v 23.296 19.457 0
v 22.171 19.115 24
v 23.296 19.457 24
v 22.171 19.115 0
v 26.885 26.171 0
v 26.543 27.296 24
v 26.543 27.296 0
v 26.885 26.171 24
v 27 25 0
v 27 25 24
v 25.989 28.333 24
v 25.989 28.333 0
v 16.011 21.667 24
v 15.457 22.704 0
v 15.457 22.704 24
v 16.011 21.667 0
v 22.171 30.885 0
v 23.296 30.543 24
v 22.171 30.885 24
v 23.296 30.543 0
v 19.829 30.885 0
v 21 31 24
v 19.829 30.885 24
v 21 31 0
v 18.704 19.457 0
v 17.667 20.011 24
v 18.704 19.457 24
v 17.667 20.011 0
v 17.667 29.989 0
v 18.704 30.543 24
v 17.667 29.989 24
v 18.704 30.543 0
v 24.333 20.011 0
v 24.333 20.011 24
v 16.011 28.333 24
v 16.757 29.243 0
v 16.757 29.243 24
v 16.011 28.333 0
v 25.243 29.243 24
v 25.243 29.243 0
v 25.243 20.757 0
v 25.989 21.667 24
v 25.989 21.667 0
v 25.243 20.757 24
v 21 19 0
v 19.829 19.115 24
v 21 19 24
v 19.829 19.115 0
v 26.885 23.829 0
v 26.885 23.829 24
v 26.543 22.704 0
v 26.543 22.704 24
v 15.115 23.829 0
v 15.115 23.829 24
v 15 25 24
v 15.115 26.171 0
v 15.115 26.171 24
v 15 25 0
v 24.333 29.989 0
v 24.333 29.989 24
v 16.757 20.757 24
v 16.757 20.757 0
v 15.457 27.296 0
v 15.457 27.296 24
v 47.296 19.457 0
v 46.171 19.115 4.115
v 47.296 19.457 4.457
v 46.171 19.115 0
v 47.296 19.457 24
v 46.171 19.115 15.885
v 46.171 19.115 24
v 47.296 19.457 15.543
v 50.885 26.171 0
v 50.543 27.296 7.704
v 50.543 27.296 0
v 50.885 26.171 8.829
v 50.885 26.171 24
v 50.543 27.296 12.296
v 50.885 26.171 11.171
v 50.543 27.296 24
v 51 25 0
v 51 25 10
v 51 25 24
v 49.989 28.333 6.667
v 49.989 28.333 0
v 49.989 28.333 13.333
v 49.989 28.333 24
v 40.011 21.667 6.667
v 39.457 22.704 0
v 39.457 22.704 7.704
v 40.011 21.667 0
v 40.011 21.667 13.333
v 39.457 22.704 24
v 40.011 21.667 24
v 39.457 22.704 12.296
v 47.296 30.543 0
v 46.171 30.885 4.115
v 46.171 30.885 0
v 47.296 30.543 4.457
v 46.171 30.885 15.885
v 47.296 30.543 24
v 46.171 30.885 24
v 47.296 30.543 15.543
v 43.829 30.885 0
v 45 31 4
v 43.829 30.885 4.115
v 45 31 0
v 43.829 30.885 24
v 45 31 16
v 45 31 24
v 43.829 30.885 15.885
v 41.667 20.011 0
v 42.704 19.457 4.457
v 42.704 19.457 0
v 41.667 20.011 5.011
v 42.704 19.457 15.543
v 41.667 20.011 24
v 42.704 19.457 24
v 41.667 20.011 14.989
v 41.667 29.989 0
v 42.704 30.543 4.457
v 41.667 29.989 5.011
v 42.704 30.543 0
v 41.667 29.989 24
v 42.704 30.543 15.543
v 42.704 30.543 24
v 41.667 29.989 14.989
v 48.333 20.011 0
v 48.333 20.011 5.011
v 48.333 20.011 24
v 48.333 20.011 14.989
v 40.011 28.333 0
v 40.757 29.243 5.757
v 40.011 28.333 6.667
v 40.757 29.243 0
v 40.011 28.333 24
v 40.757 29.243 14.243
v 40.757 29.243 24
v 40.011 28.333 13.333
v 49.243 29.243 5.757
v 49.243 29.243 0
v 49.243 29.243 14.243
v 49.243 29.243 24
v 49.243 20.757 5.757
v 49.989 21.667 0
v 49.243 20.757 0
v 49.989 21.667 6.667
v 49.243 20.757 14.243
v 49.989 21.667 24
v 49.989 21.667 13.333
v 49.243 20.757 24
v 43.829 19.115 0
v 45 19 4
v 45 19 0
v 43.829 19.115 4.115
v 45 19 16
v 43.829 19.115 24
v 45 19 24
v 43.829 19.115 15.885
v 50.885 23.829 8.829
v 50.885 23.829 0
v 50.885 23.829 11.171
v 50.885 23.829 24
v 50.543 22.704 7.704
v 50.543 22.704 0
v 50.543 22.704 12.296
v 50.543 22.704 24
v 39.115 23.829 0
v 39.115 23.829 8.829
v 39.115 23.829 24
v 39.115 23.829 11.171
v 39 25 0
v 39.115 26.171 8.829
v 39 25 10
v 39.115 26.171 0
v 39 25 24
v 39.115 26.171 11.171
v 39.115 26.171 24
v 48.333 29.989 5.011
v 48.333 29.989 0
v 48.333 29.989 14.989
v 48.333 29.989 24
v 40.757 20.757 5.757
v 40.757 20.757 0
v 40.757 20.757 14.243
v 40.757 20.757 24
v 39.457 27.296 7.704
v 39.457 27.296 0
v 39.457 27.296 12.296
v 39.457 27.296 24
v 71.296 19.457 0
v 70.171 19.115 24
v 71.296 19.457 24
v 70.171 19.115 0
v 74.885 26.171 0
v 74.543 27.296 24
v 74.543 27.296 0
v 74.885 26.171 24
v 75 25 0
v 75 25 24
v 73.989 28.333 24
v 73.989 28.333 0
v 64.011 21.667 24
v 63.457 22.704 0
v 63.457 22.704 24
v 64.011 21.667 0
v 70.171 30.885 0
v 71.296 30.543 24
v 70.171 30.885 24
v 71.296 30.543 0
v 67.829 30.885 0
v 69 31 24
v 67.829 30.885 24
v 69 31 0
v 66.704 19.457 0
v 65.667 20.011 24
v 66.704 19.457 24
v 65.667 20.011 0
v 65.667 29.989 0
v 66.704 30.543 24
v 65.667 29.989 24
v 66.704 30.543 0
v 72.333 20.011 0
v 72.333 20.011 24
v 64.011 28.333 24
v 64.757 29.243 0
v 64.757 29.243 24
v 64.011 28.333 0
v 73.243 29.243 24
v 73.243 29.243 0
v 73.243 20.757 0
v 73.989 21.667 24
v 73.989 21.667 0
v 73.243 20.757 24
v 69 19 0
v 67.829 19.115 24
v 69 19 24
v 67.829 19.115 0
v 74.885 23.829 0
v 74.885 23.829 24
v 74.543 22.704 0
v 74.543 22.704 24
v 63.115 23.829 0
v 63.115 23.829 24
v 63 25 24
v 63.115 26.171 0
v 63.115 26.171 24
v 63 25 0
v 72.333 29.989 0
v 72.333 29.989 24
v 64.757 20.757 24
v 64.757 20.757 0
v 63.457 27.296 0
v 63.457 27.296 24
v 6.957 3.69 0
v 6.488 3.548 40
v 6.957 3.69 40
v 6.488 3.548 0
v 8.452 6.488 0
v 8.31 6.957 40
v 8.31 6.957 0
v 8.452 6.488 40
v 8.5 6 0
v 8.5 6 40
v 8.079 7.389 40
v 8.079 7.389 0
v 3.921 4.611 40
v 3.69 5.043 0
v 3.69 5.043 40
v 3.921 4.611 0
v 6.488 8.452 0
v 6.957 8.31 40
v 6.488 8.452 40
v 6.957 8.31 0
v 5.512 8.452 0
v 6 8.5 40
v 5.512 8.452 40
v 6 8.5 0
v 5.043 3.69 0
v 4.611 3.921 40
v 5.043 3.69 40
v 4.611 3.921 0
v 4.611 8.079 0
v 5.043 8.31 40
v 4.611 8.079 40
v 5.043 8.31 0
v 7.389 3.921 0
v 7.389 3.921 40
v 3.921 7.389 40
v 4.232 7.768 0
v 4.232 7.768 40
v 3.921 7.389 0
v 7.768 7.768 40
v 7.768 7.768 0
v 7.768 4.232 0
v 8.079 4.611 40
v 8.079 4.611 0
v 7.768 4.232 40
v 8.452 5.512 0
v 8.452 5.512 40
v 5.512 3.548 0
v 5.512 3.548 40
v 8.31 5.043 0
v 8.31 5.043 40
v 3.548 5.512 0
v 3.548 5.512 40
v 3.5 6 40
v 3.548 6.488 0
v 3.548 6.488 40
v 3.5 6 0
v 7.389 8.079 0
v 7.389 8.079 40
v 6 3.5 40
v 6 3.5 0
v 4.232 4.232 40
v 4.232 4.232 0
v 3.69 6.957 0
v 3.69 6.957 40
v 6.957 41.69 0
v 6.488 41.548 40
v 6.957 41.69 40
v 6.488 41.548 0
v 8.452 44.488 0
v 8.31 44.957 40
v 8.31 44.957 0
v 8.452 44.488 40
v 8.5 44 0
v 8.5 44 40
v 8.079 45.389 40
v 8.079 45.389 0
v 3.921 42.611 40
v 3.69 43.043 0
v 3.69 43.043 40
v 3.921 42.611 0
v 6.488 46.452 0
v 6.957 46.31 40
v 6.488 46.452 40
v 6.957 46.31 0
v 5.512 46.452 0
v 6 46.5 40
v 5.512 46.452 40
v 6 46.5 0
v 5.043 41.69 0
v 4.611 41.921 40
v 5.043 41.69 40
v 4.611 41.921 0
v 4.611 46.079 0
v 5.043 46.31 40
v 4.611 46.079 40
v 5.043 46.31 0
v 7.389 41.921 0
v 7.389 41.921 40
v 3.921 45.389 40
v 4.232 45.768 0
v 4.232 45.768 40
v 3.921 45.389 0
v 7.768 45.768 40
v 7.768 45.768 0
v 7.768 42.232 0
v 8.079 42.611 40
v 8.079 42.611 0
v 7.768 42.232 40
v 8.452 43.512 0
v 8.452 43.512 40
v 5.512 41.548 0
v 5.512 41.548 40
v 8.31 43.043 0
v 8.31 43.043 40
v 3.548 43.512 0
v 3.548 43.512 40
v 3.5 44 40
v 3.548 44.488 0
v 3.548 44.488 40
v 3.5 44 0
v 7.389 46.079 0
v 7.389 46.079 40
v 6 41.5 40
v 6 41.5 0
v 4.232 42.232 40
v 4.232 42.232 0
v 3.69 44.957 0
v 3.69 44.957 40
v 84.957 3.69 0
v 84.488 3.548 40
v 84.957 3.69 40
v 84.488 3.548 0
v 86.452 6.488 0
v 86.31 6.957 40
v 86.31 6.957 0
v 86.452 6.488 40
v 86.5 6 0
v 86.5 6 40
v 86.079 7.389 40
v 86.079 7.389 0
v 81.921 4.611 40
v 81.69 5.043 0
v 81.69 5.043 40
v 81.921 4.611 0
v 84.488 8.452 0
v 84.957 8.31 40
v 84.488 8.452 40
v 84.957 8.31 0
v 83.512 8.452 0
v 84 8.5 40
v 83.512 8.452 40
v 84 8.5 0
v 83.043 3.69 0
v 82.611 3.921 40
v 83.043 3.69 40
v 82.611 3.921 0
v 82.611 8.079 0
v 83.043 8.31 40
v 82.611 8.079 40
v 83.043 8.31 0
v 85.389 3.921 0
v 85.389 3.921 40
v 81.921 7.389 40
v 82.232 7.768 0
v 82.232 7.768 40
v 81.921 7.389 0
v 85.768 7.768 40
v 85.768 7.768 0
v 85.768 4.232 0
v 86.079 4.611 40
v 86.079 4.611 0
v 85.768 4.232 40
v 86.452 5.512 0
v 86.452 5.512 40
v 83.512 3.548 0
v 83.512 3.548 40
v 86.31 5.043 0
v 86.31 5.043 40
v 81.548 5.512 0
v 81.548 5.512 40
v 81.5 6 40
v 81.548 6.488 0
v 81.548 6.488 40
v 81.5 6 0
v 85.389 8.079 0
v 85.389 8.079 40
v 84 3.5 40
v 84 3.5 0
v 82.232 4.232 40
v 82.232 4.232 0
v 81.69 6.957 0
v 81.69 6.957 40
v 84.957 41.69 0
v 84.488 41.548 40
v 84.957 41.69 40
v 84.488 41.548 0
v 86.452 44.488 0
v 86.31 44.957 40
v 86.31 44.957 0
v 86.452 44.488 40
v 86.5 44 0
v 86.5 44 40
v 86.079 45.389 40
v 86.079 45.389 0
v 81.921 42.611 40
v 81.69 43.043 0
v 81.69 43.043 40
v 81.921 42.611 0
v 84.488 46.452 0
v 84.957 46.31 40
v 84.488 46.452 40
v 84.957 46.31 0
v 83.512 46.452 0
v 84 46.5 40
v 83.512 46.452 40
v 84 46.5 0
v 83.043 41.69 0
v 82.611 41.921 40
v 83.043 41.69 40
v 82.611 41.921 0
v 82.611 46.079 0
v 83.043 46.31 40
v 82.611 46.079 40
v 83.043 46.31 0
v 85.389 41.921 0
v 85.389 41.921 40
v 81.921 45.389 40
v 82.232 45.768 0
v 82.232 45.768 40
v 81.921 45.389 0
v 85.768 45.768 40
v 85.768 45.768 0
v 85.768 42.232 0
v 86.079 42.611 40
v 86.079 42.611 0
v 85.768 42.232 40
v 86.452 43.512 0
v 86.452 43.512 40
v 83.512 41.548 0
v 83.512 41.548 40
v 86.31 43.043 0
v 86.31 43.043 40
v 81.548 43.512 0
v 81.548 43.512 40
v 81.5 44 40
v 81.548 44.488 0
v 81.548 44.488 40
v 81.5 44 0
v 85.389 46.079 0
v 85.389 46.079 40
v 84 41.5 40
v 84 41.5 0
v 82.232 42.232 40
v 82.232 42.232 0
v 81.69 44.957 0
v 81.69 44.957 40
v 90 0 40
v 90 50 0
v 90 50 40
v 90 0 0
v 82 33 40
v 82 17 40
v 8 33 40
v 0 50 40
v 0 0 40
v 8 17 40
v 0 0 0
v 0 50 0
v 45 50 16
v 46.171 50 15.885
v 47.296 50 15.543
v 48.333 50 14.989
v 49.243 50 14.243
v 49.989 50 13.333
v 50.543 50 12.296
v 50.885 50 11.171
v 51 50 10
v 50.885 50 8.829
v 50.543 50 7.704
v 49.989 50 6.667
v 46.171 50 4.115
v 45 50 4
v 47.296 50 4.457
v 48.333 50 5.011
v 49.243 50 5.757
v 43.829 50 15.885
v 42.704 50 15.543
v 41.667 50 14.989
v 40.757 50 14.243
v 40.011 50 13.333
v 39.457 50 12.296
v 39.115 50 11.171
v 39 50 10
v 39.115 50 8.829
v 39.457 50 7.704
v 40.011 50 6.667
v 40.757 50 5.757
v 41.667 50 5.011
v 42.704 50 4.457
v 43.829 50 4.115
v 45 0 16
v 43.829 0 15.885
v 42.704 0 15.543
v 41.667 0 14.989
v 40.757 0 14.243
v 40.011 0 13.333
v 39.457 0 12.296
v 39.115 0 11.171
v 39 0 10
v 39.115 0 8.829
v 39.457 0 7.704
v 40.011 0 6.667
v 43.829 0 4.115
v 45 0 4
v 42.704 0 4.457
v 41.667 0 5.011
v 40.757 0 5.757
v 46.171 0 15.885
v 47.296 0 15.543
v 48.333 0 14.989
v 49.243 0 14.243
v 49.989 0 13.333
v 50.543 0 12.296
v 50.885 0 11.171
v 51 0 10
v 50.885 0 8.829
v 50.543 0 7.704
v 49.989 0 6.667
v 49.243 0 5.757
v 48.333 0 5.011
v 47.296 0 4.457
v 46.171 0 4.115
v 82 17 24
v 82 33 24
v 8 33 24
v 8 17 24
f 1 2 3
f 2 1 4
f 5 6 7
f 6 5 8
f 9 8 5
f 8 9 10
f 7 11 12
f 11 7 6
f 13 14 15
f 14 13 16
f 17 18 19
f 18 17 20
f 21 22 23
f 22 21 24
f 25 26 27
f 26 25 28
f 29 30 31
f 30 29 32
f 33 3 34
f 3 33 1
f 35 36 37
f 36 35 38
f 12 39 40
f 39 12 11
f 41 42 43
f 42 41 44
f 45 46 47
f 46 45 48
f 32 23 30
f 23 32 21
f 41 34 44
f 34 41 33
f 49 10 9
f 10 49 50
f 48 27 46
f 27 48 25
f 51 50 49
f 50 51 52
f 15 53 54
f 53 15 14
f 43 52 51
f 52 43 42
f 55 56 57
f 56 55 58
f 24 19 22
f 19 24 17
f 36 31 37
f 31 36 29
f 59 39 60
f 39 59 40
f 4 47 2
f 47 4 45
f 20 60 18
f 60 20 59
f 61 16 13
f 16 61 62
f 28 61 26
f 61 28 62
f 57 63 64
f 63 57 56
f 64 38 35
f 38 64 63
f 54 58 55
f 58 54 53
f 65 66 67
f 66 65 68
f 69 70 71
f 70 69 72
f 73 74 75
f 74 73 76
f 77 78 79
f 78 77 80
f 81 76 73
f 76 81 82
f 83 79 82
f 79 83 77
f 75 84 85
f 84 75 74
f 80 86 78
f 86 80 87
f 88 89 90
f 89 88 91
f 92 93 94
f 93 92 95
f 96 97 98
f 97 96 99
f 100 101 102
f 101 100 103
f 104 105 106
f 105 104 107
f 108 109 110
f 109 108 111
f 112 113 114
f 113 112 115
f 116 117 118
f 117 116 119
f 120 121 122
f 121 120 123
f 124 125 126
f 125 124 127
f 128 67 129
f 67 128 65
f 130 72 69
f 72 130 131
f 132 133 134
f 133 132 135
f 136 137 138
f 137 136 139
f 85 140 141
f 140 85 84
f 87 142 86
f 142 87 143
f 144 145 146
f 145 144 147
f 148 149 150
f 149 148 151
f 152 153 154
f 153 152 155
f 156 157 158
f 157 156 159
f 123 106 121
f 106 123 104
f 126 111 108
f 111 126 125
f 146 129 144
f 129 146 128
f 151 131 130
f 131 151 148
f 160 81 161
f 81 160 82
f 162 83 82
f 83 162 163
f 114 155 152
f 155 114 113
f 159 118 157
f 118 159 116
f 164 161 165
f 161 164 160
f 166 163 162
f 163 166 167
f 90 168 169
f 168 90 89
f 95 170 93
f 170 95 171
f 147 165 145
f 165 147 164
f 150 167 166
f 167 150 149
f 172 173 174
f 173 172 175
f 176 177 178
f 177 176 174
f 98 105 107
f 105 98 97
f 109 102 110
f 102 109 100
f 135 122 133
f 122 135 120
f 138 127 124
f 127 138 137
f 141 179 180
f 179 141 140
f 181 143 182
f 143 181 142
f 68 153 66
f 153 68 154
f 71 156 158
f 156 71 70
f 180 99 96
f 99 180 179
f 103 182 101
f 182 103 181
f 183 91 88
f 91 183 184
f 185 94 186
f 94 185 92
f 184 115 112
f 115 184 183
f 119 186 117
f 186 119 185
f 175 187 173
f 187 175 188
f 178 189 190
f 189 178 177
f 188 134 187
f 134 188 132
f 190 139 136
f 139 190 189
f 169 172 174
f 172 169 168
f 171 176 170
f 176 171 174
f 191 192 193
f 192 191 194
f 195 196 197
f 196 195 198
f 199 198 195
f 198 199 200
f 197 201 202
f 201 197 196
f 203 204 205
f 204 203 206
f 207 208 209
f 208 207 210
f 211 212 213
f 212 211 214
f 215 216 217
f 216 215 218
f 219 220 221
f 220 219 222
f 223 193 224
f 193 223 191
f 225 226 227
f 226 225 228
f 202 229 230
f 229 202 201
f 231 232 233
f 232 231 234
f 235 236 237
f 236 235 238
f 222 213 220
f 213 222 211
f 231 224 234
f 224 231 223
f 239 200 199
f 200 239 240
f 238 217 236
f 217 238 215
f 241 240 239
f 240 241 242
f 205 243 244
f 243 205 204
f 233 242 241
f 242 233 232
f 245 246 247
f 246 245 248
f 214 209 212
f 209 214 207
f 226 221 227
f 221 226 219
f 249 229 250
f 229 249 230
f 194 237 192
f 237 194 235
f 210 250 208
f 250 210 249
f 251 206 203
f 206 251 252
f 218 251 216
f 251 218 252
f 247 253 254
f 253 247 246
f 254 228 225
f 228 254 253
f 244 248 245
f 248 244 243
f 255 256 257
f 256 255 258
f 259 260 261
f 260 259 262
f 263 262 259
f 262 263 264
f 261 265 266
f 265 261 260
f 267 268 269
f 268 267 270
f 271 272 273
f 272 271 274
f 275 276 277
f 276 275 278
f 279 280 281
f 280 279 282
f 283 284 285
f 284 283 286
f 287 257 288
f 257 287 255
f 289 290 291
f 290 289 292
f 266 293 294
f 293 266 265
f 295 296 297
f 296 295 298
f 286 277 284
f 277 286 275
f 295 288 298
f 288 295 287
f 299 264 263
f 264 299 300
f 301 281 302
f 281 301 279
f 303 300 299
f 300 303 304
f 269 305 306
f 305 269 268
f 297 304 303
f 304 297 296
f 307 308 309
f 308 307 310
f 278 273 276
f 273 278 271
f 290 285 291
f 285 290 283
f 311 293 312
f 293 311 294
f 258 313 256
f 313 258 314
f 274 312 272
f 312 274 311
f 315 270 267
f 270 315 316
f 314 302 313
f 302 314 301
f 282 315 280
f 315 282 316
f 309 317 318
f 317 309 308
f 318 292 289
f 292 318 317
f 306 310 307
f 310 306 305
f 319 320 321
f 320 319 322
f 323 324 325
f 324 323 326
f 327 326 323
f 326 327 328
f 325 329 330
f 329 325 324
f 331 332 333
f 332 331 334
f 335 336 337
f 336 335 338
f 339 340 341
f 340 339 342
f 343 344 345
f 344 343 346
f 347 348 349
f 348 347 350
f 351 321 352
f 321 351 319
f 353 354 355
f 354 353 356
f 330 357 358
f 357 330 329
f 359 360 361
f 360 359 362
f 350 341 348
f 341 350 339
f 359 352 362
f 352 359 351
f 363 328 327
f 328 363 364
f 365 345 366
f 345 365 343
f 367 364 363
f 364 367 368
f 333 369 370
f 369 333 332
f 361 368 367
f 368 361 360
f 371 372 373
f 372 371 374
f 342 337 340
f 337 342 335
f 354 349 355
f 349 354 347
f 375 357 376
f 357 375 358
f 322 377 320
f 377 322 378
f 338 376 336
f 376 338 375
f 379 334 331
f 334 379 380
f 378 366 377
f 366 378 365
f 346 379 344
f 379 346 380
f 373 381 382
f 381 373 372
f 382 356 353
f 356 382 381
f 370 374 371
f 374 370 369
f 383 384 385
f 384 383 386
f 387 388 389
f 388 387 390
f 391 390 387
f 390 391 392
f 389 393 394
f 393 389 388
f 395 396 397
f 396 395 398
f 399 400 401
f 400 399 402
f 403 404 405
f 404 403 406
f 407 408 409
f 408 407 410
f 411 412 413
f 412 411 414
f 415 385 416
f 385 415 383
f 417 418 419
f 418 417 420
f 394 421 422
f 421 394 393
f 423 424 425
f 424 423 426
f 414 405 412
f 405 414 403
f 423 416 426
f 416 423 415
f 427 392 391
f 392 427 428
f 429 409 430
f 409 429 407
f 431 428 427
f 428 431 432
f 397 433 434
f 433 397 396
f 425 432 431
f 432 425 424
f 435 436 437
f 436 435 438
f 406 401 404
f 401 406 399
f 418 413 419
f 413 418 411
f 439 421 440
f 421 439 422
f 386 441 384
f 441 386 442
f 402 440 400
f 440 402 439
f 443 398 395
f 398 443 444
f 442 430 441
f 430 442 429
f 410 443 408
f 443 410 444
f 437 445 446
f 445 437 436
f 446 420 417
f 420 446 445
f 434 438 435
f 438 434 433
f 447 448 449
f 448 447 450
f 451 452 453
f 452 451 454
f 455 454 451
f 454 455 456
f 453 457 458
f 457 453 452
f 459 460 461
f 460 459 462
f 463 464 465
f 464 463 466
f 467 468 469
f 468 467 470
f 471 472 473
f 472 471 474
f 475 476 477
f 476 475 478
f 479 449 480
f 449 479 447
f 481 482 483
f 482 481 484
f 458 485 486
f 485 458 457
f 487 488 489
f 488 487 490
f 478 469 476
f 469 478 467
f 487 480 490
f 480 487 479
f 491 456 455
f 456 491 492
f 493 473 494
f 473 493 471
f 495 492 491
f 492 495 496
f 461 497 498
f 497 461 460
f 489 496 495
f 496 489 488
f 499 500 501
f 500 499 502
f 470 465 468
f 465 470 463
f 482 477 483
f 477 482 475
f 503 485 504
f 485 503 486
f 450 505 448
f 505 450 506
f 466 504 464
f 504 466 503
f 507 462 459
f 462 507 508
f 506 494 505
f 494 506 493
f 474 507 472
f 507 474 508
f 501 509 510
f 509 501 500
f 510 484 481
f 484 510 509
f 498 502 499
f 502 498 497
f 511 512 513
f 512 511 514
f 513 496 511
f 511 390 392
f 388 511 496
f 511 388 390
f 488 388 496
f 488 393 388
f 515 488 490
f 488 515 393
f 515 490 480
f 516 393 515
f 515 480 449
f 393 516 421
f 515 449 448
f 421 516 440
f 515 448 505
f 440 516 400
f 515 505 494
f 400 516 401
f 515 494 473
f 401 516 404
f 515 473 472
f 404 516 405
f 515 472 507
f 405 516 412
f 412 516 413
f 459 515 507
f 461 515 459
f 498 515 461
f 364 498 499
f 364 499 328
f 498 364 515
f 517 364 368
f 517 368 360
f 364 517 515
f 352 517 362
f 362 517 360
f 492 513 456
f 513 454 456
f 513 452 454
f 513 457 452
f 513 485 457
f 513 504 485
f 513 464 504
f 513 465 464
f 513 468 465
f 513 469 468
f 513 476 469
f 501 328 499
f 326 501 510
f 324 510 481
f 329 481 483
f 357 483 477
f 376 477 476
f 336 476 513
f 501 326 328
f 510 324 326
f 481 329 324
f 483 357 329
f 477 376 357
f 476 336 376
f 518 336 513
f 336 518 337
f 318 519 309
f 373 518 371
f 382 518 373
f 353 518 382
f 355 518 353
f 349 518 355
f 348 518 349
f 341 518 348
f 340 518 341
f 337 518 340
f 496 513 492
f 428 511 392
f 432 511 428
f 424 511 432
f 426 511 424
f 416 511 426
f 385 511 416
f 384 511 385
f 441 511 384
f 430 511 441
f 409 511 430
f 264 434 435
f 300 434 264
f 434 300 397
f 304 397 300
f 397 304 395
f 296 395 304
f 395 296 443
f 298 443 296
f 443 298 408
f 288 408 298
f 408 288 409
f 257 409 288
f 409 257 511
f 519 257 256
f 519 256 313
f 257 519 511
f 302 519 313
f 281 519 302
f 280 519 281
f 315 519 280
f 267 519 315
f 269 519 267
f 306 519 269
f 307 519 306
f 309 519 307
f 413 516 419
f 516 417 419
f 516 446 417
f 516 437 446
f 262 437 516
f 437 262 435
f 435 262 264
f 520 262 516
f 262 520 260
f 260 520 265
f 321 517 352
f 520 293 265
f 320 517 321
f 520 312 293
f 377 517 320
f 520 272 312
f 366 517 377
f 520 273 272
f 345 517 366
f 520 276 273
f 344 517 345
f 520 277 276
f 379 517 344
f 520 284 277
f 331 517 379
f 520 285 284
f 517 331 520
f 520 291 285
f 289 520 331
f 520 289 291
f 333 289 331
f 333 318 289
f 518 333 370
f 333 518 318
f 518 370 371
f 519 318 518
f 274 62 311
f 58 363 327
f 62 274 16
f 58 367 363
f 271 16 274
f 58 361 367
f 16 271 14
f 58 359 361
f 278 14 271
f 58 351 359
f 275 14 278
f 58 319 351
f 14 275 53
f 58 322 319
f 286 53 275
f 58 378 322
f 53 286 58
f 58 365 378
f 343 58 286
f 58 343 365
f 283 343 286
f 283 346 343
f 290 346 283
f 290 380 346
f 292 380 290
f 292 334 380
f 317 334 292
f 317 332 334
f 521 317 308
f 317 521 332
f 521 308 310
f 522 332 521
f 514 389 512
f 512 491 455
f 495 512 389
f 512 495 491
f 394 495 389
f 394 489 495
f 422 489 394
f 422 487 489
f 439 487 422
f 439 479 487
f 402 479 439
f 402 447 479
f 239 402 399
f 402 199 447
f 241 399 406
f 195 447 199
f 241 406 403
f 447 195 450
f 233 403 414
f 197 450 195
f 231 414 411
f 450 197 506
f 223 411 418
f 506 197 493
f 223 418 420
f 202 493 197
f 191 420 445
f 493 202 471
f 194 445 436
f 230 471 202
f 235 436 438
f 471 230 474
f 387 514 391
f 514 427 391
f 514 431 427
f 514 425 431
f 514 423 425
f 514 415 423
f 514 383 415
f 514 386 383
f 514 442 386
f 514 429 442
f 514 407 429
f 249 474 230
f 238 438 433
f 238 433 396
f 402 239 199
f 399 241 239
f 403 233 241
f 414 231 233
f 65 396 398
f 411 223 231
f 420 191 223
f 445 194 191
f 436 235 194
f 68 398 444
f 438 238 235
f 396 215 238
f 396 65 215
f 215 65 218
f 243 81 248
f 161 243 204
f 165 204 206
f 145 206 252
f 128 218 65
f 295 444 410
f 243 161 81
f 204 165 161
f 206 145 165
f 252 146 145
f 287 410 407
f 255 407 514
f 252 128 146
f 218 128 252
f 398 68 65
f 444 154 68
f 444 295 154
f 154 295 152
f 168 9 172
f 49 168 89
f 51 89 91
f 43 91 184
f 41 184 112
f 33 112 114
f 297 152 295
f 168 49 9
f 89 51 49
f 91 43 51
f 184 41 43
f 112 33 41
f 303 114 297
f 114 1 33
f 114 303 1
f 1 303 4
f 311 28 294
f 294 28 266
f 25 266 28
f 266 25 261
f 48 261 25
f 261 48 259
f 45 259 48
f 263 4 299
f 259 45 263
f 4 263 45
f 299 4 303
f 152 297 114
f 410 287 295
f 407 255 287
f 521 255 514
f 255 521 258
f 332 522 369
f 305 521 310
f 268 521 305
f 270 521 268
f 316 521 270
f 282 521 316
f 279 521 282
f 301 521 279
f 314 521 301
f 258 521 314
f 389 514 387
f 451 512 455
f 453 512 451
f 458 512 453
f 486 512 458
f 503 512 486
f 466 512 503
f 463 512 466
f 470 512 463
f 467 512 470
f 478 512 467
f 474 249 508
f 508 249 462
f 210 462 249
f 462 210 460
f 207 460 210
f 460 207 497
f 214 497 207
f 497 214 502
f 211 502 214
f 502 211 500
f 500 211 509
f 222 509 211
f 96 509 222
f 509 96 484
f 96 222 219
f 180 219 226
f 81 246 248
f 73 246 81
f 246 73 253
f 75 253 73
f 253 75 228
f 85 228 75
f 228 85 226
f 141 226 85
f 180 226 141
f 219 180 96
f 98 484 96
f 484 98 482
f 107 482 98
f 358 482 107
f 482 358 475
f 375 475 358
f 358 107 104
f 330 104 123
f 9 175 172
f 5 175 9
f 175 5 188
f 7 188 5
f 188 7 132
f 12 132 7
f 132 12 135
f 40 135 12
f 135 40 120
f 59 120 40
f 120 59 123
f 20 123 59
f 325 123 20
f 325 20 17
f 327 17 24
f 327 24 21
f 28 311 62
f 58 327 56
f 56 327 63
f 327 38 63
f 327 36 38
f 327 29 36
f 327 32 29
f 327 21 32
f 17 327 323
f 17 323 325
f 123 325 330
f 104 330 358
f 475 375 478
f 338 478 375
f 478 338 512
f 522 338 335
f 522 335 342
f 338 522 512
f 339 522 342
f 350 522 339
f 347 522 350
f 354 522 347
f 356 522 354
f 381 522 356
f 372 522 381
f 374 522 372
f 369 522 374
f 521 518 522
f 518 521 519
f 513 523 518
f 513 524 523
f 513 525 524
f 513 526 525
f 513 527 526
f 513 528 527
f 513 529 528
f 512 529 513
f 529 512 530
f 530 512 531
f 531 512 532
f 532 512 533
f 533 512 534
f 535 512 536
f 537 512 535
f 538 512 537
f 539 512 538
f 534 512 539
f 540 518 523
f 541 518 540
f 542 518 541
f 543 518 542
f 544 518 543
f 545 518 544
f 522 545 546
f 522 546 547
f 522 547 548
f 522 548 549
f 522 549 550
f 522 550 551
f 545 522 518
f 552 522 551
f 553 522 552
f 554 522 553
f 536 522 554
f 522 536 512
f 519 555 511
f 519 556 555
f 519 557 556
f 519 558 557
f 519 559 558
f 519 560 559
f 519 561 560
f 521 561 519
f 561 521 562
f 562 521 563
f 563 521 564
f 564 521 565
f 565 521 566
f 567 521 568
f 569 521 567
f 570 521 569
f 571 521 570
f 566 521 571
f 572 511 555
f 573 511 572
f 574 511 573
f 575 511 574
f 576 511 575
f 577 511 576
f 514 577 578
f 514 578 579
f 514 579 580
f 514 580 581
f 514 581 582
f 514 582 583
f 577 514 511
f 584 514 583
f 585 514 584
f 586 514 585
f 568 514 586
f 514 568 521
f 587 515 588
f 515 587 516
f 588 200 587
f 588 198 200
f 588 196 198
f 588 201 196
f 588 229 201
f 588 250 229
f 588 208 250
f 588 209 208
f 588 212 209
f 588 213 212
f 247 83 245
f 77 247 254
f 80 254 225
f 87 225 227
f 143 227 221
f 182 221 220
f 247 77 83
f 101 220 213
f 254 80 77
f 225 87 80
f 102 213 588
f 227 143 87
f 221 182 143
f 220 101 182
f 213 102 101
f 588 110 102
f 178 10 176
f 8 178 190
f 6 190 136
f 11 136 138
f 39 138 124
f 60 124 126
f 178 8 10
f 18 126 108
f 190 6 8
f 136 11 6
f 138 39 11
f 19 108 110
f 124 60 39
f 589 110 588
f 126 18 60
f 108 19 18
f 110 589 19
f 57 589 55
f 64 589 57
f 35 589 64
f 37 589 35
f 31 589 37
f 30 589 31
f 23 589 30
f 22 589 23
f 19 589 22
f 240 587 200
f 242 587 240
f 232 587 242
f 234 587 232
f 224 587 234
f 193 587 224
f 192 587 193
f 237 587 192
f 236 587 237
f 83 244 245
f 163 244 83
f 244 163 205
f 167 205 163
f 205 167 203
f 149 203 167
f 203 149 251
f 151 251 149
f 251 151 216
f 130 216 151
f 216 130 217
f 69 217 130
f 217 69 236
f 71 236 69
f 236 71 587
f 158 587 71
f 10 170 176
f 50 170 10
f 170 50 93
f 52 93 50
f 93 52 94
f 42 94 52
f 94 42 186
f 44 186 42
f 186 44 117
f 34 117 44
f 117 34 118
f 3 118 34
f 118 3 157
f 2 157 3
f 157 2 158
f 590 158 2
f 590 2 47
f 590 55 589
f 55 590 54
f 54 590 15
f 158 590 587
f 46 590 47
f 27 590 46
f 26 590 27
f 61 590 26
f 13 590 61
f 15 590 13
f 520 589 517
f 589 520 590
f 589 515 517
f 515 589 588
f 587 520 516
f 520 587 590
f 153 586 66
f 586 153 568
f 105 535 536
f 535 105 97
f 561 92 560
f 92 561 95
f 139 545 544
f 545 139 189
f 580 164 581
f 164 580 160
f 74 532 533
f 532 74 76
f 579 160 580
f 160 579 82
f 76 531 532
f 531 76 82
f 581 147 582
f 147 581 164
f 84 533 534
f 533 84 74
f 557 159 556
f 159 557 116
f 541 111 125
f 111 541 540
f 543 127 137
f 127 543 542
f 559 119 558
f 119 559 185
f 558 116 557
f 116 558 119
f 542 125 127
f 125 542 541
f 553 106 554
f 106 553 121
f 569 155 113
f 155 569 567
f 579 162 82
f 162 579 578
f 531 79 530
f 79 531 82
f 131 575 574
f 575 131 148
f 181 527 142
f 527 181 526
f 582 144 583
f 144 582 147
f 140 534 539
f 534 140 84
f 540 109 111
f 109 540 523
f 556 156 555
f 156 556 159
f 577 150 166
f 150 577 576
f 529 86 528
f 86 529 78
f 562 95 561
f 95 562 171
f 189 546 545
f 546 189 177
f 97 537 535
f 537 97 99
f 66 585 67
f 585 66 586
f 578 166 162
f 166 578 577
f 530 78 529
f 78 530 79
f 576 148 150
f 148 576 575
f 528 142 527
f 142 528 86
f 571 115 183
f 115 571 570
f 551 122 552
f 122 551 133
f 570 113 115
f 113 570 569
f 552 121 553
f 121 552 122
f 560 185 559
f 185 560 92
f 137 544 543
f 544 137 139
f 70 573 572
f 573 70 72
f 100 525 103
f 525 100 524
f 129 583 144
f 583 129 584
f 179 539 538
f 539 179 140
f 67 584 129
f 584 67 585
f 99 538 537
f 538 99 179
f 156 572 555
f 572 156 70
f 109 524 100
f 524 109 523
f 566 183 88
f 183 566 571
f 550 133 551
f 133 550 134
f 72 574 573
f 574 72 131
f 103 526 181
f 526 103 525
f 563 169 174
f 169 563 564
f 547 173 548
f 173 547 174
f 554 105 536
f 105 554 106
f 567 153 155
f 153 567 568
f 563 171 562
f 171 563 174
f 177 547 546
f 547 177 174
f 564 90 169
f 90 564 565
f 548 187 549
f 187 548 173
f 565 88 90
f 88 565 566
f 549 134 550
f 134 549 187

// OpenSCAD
$fn = 32;

// ----------------------------------------------------------------------
// Manifold block: side_outlet manifold
// ----------------------------------------------------------------------

// --- parameters (mm) ---
block_l = 90;             // block length, X
block_w = 50;             // block width, Y
block_h = 40;             // block height, Z
port_d = 12;              // port bore diameter
port_pitch = 24;          // port pitch along X
gallery_d = 16;           // top gallery width, Y
gallery_depth = 16;       // gallery pocket depth
wall_p = 8;               // gallery end wall thickness, X
mnt_d = 5;                // mounting hole diameter
mnt_in = 6;               // mounting hole inset from the edges
out_d = 12;               // outlet bore diameter
out_z = 10;               // outlet axis height

n_ports = 3;  // ports in the row
port_x0 = (block_l - (n_ports - 1) * port_pitch) / 2;  // first port X

difference() {
  cube([block_l, block_w, block_h]);
  for (i = [0 : n_ports - 1])
    translate([port_x0 + i * port_pitch, block_w / 2, -1])
      cylinder(h = block_h + 2, d = port_d);
  translate([wall_p, block_w / 2 - gallery_d / 2, block_h - gallery_depth])
    cube([block_l - 2 * wall_p, gallery_d, gallery_depth + 1]);
  for (cx = [mnt_in, block_l - mnt_in])
    for (cy = [mnt_in, block_w - mnt_in])
      translate([cx, cy, -1]) cylinder(h = block_h + 2, d = mnt_d);
  translate([block_l / 2, -1, out_z]) rotate([-90, 0, 0])
    cylinder(h = block_w + 2, d = out_d);
}
